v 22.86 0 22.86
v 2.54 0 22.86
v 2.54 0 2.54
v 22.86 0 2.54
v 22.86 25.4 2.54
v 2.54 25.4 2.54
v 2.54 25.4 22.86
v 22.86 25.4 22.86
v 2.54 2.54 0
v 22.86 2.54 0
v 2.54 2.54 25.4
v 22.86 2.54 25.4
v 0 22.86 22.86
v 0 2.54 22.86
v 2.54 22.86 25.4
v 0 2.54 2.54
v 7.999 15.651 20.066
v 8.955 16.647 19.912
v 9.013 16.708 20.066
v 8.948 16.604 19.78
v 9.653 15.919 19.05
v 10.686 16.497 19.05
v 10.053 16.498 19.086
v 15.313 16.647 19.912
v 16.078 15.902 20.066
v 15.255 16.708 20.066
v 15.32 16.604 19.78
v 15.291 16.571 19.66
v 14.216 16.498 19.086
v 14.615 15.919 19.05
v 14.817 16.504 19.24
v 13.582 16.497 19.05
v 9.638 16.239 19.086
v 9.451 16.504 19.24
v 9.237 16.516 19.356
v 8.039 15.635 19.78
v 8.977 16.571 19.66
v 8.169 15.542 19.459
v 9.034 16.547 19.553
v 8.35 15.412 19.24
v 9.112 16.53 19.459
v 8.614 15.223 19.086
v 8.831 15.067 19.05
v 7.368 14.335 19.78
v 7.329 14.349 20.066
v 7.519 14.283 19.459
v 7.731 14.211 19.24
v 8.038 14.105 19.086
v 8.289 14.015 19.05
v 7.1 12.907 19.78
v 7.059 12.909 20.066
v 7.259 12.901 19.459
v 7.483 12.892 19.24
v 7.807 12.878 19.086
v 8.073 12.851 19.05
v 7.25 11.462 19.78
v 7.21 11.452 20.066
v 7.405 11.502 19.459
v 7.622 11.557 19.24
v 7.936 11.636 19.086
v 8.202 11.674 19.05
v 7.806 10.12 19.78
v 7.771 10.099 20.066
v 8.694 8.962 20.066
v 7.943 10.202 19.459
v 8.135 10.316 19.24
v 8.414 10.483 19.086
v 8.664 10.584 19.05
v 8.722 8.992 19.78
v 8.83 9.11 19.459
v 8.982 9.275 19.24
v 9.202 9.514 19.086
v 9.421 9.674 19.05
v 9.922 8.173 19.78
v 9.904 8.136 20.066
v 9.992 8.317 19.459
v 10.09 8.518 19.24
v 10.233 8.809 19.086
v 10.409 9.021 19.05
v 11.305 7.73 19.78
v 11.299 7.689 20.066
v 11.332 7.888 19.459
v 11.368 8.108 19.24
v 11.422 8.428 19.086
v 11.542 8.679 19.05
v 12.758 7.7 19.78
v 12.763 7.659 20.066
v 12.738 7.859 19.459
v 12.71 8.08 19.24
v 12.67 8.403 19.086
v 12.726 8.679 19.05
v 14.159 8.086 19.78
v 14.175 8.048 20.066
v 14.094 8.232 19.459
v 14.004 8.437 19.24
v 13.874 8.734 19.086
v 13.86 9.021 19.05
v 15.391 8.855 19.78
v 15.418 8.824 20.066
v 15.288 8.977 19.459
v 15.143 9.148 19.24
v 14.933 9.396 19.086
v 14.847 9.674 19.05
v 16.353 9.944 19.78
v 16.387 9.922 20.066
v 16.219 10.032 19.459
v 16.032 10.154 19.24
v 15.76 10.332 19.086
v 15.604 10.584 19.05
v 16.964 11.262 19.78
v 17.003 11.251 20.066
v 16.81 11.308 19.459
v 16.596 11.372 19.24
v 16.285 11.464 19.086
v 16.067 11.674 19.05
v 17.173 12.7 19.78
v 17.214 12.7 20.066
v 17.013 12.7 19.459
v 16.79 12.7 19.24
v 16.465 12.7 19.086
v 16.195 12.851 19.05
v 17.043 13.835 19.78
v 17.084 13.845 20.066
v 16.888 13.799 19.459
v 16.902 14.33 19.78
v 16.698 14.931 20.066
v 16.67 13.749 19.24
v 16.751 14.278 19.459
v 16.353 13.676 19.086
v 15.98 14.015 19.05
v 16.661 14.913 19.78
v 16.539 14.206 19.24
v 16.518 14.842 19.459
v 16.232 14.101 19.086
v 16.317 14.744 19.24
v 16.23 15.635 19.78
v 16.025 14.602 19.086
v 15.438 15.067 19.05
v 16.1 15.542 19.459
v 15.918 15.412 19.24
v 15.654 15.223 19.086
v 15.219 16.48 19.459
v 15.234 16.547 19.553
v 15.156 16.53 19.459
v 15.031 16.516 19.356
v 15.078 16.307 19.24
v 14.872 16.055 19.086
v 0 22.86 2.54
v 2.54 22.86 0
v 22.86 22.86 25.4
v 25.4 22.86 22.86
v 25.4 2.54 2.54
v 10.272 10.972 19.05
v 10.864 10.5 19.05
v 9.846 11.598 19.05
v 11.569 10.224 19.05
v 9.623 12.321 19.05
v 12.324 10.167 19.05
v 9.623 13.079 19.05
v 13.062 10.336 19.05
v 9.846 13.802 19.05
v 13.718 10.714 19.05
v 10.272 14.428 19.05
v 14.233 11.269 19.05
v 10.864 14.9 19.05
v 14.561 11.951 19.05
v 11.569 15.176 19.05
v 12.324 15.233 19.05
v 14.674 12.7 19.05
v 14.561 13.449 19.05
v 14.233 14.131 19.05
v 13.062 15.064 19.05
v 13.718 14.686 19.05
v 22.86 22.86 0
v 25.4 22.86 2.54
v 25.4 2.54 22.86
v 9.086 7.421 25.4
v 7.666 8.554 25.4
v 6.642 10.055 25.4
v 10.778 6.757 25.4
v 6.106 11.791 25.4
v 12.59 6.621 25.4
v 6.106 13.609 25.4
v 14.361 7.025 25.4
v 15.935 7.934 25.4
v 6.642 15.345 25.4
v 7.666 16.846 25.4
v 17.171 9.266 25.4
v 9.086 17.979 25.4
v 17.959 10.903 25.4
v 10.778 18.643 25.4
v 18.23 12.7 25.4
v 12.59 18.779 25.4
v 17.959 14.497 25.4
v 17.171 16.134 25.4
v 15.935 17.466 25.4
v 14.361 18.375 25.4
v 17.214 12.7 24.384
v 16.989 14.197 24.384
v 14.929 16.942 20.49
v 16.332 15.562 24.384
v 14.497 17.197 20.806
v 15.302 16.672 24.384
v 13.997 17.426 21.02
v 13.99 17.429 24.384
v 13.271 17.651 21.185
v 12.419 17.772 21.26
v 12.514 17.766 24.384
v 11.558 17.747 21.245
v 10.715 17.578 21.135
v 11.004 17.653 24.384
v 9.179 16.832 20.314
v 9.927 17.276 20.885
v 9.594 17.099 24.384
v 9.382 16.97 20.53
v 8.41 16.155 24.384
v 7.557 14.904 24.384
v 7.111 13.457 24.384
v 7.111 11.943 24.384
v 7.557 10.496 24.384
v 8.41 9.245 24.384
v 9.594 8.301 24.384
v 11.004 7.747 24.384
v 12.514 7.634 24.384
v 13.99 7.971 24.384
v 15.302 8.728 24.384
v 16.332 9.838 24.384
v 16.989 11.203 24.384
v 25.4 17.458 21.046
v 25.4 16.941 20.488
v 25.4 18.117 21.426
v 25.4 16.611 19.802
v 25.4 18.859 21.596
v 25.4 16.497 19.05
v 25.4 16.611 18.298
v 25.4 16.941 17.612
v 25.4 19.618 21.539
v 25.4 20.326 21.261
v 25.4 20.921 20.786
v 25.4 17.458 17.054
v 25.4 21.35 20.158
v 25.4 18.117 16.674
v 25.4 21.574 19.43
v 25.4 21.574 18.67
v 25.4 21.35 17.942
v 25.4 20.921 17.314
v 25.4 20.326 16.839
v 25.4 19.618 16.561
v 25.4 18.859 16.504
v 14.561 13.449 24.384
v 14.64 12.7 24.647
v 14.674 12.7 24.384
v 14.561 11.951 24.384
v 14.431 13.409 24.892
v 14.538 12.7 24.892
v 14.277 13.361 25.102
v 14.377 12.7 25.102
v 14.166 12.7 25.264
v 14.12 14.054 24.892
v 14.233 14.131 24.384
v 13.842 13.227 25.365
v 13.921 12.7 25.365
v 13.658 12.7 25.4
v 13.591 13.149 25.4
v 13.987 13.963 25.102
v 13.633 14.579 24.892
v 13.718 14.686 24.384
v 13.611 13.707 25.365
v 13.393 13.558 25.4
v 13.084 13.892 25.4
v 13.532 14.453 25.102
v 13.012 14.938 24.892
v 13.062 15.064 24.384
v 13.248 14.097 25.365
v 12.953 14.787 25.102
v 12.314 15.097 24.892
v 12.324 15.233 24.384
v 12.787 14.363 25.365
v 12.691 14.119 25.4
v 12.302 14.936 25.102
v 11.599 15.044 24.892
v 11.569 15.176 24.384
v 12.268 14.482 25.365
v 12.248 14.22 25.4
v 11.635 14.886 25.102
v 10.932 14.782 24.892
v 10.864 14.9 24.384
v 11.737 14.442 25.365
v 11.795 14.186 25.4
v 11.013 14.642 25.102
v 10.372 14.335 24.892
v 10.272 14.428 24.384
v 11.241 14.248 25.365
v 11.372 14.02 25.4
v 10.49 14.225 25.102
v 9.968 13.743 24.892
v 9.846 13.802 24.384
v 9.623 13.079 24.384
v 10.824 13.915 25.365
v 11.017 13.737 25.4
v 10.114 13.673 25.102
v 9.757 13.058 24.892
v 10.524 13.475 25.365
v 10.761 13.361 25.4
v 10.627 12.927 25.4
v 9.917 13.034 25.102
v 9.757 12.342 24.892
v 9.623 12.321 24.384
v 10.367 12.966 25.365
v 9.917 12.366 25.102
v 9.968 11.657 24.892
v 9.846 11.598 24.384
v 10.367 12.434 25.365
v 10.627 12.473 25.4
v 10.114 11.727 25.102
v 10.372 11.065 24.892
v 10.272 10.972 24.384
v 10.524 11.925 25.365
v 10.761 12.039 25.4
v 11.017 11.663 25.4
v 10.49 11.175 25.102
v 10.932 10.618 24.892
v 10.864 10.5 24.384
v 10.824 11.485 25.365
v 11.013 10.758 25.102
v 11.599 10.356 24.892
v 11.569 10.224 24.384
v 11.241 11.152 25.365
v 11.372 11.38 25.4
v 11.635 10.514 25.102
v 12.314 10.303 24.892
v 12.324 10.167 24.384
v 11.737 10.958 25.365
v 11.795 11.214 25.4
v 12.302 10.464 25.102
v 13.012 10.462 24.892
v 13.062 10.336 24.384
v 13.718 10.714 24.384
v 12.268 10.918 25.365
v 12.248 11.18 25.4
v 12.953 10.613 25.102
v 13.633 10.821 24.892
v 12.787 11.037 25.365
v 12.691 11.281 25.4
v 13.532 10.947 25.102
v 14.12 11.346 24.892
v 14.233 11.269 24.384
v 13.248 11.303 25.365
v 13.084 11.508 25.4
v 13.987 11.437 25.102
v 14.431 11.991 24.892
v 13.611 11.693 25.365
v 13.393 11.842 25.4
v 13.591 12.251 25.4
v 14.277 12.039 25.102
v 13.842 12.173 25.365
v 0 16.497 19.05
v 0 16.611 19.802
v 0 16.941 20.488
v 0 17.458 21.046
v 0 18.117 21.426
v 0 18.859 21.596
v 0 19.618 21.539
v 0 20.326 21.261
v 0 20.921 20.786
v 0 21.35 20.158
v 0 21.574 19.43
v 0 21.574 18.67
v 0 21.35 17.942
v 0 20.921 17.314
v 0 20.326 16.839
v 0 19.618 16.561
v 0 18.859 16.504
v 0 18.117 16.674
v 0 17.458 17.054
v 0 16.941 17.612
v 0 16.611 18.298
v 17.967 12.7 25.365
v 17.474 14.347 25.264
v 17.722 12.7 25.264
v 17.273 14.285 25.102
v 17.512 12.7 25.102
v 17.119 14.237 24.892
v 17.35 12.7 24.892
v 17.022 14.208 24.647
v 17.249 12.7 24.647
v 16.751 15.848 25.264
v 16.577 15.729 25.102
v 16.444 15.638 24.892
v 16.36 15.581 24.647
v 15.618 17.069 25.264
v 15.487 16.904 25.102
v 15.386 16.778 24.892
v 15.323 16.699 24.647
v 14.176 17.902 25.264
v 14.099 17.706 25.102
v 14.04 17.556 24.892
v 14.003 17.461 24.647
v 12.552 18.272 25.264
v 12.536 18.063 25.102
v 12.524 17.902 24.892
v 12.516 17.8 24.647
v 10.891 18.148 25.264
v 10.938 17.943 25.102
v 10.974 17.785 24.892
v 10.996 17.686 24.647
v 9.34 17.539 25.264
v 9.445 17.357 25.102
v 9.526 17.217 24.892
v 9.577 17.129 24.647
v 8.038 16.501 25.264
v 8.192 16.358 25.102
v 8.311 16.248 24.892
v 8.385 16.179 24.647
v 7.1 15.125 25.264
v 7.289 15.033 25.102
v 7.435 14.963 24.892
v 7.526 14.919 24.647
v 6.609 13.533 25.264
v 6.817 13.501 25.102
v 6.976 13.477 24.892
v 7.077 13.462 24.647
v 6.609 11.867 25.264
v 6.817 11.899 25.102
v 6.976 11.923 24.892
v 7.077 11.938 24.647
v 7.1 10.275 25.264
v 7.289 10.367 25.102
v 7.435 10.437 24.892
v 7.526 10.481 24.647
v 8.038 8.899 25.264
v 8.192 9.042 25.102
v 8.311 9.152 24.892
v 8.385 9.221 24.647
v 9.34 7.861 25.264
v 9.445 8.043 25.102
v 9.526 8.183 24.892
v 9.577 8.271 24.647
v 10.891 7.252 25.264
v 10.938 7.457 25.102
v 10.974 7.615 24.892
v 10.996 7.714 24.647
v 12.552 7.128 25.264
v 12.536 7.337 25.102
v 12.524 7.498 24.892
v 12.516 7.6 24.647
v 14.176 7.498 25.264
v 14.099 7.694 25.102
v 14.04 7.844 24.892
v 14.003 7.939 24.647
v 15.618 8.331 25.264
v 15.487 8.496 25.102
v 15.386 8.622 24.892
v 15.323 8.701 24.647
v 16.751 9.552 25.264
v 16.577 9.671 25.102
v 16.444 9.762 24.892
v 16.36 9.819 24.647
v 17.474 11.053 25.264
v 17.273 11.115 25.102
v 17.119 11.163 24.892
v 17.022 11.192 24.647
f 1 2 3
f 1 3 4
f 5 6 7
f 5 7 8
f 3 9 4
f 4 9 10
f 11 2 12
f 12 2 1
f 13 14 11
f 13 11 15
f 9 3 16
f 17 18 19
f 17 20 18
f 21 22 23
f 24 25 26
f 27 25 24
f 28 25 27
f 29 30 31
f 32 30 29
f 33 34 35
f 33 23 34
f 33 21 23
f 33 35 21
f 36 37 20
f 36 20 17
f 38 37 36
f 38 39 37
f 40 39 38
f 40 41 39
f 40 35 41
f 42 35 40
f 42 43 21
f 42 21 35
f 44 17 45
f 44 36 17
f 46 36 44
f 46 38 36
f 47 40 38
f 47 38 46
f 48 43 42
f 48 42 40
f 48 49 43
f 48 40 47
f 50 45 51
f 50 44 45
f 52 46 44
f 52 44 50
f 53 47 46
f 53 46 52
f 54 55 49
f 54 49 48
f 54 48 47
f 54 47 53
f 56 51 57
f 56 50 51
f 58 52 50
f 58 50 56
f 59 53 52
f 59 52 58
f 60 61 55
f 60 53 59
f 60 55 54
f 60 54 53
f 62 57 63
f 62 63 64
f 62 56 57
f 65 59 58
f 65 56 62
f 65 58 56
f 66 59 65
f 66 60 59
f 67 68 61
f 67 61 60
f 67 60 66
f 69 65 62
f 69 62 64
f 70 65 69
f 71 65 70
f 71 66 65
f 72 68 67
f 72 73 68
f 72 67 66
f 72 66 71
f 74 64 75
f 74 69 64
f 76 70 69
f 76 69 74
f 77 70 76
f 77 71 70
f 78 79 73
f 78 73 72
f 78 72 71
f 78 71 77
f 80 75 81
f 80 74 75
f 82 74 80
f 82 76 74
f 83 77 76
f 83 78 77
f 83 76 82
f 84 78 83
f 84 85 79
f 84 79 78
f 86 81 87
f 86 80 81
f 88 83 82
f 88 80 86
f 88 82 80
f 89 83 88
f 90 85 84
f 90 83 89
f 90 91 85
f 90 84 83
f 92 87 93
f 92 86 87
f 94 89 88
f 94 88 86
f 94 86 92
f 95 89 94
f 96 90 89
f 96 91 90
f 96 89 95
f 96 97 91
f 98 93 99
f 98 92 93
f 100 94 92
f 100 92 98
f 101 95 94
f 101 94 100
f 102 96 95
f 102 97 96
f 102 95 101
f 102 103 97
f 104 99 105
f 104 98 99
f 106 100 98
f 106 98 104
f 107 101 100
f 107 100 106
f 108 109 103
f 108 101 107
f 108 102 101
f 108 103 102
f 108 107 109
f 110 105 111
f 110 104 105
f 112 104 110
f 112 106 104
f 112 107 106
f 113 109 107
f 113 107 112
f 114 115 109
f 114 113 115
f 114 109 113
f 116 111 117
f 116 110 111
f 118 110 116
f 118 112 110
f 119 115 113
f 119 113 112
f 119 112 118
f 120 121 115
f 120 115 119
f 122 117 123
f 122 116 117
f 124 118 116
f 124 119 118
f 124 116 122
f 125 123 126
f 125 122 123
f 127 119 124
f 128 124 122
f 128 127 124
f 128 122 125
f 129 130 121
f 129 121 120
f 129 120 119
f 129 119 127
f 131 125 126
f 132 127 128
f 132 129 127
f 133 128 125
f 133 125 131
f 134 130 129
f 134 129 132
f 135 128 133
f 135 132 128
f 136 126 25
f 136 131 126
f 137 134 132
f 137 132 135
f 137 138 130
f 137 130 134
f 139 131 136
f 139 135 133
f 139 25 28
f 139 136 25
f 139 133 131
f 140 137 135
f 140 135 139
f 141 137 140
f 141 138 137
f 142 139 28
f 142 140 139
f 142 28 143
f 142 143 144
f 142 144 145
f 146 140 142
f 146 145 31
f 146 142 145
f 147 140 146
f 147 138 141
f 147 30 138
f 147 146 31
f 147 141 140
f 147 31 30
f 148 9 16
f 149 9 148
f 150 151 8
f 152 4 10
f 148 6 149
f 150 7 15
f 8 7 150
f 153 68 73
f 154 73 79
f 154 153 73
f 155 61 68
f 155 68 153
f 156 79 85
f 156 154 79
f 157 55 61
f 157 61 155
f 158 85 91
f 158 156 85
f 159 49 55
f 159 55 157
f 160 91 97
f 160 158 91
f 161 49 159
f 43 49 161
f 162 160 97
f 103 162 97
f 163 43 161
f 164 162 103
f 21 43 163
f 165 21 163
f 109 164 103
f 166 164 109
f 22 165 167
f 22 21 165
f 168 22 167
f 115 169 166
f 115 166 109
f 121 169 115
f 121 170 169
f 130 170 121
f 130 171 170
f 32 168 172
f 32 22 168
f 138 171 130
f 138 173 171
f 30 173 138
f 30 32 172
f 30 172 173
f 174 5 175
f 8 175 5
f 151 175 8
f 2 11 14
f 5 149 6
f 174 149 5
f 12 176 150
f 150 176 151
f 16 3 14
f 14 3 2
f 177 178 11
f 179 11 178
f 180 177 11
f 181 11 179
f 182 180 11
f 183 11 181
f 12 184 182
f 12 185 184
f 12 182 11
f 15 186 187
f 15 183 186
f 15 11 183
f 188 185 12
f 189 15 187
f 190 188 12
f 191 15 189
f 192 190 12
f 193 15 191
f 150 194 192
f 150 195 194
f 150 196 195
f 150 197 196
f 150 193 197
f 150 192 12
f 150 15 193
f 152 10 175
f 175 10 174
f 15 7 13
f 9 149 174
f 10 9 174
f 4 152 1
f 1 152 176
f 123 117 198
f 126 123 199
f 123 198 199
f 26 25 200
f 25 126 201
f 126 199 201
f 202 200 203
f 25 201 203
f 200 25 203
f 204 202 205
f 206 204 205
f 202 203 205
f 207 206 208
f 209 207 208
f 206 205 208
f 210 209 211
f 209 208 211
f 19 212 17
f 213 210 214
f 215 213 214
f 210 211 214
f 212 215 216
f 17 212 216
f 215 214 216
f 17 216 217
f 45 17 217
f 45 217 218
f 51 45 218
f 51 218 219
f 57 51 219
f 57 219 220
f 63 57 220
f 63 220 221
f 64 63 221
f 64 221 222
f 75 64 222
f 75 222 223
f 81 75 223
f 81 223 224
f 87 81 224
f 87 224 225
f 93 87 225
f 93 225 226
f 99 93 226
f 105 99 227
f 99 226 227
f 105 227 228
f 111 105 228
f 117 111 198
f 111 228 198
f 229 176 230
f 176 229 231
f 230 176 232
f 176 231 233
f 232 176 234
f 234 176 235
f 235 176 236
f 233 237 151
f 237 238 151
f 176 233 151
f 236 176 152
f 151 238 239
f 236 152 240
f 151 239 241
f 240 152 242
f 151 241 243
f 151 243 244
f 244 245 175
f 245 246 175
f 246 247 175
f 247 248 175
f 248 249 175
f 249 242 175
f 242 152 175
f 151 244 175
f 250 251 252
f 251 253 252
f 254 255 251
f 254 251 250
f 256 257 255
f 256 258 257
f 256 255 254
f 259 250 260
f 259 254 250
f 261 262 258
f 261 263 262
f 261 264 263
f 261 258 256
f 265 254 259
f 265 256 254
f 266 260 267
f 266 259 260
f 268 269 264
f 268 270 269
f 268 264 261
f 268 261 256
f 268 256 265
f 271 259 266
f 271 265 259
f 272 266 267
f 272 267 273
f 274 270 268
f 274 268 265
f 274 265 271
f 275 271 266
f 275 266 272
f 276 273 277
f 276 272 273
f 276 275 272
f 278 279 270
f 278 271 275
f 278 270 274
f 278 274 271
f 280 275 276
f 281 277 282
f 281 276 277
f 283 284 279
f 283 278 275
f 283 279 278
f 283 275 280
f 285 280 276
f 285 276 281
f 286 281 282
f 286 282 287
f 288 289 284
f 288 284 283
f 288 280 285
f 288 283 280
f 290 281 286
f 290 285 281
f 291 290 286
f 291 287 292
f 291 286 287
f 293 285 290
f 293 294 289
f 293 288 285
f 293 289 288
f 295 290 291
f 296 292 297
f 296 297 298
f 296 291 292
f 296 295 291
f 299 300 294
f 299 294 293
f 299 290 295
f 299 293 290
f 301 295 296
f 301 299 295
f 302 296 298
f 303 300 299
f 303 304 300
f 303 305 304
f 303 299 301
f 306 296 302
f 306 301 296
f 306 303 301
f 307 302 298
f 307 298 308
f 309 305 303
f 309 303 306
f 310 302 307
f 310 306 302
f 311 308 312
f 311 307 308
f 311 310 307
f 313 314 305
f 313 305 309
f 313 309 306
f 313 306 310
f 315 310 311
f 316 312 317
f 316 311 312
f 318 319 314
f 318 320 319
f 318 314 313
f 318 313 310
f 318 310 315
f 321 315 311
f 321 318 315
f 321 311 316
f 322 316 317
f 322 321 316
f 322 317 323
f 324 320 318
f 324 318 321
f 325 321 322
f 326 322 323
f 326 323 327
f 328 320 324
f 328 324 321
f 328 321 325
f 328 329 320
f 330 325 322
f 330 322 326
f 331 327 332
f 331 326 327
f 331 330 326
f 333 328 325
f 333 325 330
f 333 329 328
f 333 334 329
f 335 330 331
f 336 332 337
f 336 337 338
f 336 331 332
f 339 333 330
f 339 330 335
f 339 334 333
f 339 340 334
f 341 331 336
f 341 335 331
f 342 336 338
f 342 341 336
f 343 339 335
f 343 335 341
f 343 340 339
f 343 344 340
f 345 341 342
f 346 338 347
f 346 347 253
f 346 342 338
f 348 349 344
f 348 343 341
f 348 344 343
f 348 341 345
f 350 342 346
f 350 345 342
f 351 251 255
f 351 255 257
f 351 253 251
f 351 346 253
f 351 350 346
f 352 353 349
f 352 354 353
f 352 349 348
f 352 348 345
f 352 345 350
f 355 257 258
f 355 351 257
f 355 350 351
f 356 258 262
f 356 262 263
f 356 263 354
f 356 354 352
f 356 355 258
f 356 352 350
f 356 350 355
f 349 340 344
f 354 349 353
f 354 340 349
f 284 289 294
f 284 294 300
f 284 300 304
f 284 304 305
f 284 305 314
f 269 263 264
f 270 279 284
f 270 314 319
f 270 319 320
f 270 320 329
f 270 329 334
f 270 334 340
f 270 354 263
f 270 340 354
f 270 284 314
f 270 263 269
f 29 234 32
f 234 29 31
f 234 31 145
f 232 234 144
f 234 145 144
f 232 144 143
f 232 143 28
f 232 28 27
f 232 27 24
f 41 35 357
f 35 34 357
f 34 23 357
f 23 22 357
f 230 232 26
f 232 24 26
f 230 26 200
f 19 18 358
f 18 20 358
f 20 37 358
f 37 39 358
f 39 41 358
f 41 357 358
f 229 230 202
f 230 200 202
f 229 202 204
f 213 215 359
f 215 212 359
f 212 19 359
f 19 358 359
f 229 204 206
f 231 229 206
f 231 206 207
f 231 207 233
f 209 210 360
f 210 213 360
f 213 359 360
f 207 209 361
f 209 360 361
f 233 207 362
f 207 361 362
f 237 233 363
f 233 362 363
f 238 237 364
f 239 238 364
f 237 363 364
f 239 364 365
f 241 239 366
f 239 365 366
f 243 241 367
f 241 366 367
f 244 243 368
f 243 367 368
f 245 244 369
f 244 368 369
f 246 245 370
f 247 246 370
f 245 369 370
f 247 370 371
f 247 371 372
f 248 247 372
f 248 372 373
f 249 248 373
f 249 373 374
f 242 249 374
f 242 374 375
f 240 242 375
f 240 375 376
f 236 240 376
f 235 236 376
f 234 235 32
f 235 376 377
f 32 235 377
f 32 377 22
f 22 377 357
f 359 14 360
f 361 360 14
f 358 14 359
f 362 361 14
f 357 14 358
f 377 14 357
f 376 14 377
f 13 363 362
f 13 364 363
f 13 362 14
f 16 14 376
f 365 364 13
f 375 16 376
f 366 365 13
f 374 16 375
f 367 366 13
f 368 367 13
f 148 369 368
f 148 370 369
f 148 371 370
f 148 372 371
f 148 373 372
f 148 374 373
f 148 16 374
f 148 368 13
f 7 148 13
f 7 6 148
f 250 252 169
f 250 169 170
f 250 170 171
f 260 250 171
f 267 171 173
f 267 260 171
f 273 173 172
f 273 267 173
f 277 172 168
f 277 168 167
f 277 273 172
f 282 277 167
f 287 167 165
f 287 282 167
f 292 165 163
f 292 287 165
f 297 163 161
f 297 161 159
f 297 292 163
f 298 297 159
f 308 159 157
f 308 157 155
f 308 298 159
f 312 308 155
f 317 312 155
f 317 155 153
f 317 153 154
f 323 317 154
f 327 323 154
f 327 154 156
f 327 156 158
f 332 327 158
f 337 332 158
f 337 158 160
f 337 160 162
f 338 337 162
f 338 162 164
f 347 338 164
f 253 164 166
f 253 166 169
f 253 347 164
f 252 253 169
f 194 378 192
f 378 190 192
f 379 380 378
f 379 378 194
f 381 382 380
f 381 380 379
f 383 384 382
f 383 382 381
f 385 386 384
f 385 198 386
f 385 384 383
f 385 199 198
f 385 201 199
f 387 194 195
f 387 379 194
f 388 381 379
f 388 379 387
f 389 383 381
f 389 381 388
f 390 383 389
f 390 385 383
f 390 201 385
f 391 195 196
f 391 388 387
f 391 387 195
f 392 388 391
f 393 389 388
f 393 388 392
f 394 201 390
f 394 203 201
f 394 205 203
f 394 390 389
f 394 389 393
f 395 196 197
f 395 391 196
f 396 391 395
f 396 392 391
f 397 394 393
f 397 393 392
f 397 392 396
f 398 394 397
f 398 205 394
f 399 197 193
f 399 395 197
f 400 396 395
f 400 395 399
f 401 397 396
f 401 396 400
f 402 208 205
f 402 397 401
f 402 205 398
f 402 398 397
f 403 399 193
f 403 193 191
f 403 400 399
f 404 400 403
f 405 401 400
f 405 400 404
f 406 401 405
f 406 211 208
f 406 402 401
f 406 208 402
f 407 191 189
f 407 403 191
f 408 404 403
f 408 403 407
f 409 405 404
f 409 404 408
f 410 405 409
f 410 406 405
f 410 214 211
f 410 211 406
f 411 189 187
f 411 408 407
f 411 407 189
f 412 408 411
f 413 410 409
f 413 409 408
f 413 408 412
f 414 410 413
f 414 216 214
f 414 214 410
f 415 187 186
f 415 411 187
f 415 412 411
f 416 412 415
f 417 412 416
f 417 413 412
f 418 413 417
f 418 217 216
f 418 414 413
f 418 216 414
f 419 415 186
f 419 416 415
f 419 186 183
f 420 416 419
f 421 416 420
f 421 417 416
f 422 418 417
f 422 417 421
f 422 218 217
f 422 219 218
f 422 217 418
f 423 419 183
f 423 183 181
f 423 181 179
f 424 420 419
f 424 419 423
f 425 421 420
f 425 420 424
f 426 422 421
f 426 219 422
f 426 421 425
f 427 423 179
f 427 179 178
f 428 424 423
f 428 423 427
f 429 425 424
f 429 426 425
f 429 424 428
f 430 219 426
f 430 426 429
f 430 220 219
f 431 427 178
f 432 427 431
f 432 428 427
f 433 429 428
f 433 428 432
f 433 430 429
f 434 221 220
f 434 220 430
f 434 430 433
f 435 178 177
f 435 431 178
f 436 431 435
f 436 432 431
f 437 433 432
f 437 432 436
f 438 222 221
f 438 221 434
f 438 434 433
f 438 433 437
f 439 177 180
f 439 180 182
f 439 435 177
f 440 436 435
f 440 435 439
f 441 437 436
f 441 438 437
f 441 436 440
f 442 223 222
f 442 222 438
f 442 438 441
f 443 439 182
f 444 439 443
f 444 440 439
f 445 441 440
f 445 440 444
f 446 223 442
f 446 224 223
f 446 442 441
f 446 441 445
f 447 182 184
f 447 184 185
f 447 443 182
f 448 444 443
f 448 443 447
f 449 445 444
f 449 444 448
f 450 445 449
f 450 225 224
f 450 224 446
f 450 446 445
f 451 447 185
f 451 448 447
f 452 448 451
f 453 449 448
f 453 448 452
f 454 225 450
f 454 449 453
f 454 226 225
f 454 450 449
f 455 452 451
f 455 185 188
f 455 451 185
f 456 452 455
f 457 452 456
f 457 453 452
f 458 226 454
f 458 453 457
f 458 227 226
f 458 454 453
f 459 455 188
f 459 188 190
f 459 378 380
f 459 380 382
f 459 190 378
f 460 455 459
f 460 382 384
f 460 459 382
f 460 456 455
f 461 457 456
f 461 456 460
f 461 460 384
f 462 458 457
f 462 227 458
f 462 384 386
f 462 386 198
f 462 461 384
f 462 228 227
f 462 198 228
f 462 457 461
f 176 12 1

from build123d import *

# Parameters (mm, degrees)
F0_W     = 25.4
F0_H     = 25.4
F1_DEPTH = 25.4
F2_R     = 5.08
F2_R_2   = 2.54
F3_DEPTH = 6.35
F4_R     = 1.016
F5_SIZE  = 2.54
F7_D     = 5.1054


with BuildPart() as f1:
    # F0 (on Top) → F1 (new body)
    with BuildSketch(Plane.XY):
        with Locations((12.7, 12.7)):
            Rectangle(F0_W, F0_H)
    extrude(amount=F1_DEPTH)

    # F2 (on face) → F3 (cut)
    with BuildSketch(Plane.XY.offset(25.4)):
        with Locations((12.1342176571, 12.7)):
            Circle(F2_R)
        with Locations((12.1342176571, 12.7)):
            Circle(F2_R_2, mode=Mode.SUBTRACT)
    extrude(amount=-F3_DEPTH, mode=Mode.SUBTRACT)

    # F4
    f4_edges = [f1.edges().sort_by_distance(p)[0] for p in [
        (9.594218, 12.7, 25.4),
        (17.214218, 12.7, 22.225),
        (7.054218, 12.7, 25.4),
        (7.054218, 12.7, 19.05),
    ]]
    fillet(f4_edges, radius=F4_R)

    # F5
    f5_edges = [f1.edges().sort_by_distance(p)[0] for p in [
        (25.4, 12.7, 25.4),
        (25.4, 25.4, 12.7),
        (0, 25.4, 12.7),
        (12.7, 25.4, 0),
        (12.7, 25.4, 25.4),
        (12.7, 0, 25.4),
        (0, 12.7, 25.4),
        (0, 0, 12.7),
        (25.4, 0, 12.7),
        (12.7, 0, 0),
        (0, 12.7, 0),
        (25.4, 12.7, 0),
    ]]
    chamfer(f5_edges, length=F5_SIZE)

    # F7 (through all)
    with Locations(Plane.YZ.offset(25.4)):
        with Locations((19.05, 19.05)):
            Hole(F7_D / 2)


solid = f1.part
